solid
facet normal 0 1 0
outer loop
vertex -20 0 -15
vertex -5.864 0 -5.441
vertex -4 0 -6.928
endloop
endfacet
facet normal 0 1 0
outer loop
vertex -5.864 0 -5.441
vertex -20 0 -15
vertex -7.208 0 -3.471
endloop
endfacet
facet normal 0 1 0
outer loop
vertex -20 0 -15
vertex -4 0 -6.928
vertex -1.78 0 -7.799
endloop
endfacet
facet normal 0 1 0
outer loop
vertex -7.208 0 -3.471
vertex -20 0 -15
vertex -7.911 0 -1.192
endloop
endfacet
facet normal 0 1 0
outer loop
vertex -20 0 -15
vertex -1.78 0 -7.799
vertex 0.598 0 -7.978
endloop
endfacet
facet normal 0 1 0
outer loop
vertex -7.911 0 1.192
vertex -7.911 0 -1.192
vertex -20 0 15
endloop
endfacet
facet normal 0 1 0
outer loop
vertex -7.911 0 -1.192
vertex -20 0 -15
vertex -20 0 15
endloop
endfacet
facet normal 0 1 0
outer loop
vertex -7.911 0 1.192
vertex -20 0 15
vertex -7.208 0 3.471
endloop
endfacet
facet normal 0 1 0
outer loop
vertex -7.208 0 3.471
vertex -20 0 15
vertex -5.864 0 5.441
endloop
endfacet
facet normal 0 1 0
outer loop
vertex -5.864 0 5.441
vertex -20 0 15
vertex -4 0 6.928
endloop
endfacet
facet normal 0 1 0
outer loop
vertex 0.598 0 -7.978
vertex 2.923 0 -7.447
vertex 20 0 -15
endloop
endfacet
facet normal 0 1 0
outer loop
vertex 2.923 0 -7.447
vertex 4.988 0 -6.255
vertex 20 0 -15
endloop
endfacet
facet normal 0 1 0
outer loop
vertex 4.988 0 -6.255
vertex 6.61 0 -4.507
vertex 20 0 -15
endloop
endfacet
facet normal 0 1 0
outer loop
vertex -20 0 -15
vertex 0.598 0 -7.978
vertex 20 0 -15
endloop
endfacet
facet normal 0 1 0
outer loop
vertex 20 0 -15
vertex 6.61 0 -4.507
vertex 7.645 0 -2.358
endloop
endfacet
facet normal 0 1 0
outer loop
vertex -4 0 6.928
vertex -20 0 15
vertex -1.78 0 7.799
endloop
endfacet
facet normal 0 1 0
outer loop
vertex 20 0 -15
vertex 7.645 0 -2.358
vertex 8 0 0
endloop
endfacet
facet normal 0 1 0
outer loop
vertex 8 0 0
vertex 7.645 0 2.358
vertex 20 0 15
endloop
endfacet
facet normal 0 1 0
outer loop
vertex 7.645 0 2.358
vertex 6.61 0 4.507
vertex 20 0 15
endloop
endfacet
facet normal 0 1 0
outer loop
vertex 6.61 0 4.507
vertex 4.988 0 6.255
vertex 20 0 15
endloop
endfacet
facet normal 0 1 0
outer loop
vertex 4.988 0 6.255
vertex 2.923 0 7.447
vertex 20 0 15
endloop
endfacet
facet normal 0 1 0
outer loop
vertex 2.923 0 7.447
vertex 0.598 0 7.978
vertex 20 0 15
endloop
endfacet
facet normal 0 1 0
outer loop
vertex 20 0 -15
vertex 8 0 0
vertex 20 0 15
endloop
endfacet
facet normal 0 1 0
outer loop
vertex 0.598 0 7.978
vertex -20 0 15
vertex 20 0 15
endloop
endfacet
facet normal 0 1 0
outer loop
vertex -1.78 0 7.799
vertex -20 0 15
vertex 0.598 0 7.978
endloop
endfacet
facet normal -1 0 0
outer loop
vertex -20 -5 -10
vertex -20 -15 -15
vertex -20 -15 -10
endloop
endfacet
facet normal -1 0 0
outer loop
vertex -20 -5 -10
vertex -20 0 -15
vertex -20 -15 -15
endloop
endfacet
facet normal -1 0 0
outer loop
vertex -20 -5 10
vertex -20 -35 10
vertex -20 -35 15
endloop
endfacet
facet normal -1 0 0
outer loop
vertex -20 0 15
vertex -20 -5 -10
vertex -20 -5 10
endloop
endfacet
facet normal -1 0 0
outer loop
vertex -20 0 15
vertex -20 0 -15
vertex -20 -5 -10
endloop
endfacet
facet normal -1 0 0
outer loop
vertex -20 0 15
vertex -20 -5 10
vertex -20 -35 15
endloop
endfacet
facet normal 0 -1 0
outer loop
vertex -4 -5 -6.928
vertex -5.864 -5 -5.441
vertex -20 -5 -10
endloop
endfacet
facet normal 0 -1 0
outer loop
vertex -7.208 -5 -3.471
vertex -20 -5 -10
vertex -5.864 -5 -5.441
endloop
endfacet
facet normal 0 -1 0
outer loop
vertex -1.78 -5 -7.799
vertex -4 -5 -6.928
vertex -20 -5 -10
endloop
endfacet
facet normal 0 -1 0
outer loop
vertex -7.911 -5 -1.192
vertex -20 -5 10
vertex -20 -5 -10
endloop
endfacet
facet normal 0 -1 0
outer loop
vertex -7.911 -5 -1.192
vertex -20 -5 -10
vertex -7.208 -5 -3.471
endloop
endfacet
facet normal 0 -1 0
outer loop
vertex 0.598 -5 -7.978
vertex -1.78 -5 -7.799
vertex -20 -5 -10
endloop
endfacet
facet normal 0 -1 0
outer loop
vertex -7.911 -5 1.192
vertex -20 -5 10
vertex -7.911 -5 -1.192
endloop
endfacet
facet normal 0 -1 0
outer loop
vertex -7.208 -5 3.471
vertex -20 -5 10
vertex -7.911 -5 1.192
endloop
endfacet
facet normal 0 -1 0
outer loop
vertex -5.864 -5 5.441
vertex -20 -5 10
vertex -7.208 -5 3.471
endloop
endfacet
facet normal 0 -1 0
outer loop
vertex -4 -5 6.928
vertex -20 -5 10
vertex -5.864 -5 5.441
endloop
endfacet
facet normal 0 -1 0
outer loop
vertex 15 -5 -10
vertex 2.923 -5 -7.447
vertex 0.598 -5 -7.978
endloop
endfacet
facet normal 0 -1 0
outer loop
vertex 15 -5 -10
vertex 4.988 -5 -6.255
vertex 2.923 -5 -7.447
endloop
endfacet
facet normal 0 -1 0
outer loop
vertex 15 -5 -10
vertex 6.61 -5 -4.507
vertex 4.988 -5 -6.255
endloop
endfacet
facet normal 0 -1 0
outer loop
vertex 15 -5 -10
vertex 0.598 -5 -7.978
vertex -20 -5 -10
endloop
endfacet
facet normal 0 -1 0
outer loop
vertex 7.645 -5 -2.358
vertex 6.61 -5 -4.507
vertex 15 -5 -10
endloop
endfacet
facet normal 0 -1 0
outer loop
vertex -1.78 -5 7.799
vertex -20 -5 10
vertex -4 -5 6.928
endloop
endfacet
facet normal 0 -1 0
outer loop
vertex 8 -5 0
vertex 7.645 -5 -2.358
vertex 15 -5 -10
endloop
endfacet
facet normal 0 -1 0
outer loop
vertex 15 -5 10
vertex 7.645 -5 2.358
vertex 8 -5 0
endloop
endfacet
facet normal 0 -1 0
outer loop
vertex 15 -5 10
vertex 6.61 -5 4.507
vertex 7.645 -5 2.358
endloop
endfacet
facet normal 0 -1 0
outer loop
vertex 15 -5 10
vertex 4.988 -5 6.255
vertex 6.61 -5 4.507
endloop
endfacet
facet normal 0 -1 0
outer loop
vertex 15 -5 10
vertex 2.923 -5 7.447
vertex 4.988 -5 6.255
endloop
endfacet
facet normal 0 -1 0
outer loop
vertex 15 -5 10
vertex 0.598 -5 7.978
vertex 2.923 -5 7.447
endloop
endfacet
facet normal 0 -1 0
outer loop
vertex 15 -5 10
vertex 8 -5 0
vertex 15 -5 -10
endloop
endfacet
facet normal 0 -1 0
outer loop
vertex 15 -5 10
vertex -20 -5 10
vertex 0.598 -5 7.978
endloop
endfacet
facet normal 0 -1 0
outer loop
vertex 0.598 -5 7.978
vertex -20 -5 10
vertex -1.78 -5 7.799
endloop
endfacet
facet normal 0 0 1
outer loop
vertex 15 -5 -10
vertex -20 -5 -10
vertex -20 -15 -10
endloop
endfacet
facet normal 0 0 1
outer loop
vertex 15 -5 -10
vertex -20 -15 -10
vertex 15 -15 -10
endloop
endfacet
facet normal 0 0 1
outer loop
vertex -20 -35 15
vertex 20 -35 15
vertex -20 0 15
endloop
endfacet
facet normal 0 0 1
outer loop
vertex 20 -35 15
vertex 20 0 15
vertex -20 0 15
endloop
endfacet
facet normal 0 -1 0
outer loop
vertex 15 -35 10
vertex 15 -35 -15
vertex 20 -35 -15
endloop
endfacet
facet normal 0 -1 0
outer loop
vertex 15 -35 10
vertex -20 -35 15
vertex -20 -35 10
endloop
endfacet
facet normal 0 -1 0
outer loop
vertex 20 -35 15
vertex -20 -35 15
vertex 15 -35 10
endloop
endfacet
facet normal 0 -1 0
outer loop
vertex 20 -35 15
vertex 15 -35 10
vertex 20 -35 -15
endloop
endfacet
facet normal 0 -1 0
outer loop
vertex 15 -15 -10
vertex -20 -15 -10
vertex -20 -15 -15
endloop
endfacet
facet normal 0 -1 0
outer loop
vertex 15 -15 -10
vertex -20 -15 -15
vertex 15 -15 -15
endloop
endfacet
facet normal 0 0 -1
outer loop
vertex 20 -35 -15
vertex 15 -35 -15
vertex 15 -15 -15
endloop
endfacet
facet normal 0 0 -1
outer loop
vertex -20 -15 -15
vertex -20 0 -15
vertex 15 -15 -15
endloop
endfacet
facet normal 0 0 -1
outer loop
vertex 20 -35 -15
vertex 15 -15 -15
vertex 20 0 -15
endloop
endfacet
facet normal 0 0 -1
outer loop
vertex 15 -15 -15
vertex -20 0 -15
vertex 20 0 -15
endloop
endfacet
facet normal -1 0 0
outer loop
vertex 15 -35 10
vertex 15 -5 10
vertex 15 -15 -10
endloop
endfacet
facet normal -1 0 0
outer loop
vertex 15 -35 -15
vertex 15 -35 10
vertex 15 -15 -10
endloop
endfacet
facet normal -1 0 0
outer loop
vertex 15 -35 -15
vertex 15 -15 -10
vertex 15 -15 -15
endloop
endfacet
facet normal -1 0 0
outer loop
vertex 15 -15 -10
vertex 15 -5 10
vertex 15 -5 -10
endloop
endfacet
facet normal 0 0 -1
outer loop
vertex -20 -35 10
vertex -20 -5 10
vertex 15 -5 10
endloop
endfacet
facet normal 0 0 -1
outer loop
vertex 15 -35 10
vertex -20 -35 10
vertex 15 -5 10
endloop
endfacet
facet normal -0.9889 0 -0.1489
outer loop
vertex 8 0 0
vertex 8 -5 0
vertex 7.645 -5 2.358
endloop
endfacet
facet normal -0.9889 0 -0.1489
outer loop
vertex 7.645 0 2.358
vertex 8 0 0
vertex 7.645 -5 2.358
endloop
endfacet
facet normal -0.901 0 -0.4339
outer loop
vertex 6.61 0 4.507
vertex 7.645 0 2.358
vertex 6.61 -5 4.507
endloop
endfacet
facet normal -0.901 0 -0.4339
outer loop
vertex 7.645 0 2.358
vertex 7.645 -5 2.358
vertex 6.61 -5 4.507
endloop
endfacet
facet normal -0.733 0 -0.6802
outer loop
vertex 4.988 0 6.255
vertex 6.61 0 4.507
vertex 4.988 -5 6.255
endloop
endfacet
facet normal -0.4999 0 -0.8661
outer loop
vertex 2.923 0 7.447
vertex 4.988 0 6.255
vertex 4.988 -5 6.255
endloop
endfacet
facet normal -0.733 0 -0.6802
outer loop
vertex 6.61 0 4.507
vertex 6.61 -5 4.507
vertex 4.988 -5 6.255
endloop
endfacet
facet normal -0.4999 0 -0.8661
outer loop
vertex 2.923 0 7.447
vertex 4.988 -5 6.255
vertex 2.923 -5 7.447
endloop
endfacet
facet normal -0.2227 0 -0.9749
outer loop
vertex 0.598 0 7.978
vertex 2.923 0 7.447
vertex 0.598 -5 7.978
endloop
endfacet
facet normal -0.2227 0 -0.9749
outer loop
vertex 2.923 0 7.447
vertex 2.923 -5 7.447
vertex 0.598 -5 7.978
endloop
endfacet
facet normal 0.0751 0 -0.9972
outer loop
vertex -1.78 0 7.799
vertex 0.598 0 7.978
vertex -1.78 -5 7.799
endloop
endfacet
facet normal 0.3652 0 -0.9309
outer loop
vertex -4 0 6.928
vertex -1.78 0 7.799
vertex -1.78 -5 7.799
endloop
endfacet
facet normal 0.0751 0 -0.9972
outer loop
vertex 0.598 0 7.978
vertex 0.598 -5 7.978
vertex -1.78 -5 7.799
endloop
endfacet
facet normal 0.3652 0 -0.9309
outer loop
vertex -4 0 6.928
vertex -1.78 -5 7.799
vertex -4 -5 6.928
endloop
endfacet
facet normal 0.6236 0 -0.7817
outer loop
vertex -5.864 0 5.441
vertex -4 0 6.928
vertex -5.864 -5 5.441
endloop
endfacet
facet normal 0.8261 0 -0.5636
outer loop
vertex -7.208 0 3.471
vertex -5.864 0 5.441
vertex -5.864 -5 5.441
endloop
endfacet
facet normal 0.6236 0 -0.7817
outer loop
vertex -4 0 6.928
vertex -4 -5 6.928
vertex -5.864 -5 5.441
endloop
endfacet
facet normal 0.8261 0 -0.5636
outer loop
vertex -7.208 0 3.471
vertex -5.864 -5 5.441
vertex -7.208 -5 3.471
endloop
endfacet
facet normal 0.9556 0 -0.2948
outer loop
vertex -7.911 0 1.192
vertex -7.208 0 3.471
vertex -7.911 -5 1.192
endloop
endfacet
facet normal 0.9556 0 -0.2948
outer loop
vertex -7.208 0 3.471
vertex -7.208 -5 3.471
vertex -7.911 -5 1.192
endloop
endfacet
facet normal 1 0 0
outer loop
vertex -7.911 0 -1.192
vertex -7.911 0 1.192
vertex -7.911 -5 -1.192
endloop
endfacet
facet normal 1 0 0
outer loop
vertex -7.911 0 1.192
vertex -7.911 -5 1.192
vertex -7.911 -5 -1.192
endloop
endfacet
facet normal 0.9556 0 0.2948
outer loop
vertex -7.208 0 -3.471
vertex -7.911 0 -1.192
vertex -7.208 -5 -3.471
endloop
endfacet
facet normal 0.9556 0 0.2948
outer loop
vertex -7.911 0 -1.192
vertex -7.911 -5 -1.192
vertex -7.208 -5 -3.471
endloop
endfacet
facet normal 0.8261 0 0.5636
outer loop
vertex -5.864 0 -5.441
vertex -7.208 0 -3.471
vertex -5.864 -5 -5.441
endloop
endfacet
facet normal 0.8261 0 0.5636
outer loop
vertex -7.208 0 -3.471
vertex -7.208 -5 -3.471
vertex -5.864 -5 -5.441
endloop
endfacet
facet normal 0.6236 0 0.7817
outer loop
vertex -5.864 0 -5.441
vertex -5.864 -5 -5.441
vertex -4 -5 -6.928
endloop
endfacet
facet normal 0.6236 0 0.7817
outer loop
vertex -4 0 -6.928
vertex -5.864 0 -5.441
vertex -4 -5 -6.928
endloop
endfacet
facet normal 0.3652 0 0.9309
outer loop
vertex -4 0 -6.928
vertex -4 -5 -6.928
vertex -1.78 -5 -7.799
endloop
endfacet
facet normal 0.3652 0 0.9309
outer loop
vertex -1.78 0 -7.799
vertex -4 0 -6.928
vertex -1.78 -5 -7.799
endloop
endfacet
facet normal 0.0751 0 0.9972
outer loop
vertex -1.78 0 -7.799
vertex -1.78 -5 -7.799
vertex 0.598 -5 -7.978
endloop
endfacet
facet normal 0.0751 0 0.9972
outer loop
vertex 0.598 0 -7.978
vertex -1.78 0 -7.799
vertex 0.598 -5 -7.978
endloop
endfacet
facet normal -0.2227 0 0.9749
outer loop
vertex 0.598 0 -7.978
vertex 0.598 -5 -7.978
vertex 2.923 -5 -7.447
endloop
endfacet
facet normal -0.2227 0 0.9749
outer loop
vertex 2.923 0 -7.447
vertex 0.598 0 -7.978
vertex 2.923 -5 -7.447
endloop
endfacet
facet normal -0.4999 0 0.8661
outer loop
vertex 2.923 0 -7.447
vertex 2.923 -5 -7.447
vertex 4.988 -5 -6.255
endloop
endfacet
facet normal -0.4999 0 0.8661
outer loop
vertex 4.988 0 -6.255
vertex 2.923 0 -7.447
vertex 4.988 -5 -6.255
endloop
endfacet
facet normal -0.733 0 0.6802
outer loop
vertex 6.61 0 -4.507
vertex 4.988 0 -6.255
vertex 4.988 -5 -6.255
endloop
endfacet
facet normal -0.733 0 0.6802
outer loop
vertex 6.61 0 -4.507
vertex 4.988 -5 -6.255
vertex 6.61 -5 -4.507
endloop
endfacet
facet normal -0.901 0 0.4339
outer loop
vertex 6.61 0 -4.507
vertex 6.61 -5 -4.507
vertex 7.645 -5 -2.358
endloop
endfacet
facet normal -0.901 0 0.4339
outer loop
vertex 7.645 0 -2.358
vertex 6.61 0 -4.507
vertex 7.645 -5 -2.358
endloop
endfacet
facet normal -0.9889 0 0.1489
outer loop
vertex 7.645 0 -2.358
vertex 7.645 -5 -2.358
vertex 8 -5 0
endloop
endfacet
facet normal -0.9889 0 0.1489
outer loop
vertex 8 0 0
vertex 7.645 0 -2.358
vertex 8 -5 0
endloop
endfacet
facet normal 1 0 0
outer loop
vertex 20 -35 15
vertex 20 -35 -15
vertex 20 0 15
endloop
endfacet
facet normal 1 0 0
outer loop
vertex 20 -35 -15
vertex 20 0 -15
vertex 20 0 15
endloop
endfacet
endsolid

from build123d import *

# Parameters (mm, degrees)
F0_W     = 40
F0_H     = 30
F1_DEPTH = 5
F2_R     = 8
F3_DEPTH = 25
F4_W     = 35
F4_H     = 5
F5_DEPTH = 30
F6_W     = 35
F6_H     = 5
F7_DEPTH = 10


with BuildPart() as f1:
    # F0 (on Front) → F1 (new body)
    with BuildSketch(Plane.XZ):
        Rectangle(F0_W, F0_H)
    extrude(amount=F1_DEPTH)

    # F2 (on face) → F3 (cut)
    with BuildSketch(Plane.XZ.offset(5)):
        Circle(F2_R)
    extrude(amount=-F3_DEPTH, mode=Mode.SUBTRACT)

    # F4 (on face) → F5 (join)
    with BuildSketch(Plane.XZ.offset(5)):
        Polygon((15, -15), (20, -15), (20, 15), (15, 15), (15, 10), align=None)
        with Locations((-2.5, 12.5)):
            Rectangle(F4_W, F4_H)
    extrude(amount=F5_DEPTH)

    # F6 (on face) → F7 (join)
    with BuildSketch(Plane.XZ.offset(5)):
        with Locations((-2.5, -12.5)):
            Rectangle(F6_W, F6_H)
    extrude(amount=F7_DEPTH)


solid = f1.part
